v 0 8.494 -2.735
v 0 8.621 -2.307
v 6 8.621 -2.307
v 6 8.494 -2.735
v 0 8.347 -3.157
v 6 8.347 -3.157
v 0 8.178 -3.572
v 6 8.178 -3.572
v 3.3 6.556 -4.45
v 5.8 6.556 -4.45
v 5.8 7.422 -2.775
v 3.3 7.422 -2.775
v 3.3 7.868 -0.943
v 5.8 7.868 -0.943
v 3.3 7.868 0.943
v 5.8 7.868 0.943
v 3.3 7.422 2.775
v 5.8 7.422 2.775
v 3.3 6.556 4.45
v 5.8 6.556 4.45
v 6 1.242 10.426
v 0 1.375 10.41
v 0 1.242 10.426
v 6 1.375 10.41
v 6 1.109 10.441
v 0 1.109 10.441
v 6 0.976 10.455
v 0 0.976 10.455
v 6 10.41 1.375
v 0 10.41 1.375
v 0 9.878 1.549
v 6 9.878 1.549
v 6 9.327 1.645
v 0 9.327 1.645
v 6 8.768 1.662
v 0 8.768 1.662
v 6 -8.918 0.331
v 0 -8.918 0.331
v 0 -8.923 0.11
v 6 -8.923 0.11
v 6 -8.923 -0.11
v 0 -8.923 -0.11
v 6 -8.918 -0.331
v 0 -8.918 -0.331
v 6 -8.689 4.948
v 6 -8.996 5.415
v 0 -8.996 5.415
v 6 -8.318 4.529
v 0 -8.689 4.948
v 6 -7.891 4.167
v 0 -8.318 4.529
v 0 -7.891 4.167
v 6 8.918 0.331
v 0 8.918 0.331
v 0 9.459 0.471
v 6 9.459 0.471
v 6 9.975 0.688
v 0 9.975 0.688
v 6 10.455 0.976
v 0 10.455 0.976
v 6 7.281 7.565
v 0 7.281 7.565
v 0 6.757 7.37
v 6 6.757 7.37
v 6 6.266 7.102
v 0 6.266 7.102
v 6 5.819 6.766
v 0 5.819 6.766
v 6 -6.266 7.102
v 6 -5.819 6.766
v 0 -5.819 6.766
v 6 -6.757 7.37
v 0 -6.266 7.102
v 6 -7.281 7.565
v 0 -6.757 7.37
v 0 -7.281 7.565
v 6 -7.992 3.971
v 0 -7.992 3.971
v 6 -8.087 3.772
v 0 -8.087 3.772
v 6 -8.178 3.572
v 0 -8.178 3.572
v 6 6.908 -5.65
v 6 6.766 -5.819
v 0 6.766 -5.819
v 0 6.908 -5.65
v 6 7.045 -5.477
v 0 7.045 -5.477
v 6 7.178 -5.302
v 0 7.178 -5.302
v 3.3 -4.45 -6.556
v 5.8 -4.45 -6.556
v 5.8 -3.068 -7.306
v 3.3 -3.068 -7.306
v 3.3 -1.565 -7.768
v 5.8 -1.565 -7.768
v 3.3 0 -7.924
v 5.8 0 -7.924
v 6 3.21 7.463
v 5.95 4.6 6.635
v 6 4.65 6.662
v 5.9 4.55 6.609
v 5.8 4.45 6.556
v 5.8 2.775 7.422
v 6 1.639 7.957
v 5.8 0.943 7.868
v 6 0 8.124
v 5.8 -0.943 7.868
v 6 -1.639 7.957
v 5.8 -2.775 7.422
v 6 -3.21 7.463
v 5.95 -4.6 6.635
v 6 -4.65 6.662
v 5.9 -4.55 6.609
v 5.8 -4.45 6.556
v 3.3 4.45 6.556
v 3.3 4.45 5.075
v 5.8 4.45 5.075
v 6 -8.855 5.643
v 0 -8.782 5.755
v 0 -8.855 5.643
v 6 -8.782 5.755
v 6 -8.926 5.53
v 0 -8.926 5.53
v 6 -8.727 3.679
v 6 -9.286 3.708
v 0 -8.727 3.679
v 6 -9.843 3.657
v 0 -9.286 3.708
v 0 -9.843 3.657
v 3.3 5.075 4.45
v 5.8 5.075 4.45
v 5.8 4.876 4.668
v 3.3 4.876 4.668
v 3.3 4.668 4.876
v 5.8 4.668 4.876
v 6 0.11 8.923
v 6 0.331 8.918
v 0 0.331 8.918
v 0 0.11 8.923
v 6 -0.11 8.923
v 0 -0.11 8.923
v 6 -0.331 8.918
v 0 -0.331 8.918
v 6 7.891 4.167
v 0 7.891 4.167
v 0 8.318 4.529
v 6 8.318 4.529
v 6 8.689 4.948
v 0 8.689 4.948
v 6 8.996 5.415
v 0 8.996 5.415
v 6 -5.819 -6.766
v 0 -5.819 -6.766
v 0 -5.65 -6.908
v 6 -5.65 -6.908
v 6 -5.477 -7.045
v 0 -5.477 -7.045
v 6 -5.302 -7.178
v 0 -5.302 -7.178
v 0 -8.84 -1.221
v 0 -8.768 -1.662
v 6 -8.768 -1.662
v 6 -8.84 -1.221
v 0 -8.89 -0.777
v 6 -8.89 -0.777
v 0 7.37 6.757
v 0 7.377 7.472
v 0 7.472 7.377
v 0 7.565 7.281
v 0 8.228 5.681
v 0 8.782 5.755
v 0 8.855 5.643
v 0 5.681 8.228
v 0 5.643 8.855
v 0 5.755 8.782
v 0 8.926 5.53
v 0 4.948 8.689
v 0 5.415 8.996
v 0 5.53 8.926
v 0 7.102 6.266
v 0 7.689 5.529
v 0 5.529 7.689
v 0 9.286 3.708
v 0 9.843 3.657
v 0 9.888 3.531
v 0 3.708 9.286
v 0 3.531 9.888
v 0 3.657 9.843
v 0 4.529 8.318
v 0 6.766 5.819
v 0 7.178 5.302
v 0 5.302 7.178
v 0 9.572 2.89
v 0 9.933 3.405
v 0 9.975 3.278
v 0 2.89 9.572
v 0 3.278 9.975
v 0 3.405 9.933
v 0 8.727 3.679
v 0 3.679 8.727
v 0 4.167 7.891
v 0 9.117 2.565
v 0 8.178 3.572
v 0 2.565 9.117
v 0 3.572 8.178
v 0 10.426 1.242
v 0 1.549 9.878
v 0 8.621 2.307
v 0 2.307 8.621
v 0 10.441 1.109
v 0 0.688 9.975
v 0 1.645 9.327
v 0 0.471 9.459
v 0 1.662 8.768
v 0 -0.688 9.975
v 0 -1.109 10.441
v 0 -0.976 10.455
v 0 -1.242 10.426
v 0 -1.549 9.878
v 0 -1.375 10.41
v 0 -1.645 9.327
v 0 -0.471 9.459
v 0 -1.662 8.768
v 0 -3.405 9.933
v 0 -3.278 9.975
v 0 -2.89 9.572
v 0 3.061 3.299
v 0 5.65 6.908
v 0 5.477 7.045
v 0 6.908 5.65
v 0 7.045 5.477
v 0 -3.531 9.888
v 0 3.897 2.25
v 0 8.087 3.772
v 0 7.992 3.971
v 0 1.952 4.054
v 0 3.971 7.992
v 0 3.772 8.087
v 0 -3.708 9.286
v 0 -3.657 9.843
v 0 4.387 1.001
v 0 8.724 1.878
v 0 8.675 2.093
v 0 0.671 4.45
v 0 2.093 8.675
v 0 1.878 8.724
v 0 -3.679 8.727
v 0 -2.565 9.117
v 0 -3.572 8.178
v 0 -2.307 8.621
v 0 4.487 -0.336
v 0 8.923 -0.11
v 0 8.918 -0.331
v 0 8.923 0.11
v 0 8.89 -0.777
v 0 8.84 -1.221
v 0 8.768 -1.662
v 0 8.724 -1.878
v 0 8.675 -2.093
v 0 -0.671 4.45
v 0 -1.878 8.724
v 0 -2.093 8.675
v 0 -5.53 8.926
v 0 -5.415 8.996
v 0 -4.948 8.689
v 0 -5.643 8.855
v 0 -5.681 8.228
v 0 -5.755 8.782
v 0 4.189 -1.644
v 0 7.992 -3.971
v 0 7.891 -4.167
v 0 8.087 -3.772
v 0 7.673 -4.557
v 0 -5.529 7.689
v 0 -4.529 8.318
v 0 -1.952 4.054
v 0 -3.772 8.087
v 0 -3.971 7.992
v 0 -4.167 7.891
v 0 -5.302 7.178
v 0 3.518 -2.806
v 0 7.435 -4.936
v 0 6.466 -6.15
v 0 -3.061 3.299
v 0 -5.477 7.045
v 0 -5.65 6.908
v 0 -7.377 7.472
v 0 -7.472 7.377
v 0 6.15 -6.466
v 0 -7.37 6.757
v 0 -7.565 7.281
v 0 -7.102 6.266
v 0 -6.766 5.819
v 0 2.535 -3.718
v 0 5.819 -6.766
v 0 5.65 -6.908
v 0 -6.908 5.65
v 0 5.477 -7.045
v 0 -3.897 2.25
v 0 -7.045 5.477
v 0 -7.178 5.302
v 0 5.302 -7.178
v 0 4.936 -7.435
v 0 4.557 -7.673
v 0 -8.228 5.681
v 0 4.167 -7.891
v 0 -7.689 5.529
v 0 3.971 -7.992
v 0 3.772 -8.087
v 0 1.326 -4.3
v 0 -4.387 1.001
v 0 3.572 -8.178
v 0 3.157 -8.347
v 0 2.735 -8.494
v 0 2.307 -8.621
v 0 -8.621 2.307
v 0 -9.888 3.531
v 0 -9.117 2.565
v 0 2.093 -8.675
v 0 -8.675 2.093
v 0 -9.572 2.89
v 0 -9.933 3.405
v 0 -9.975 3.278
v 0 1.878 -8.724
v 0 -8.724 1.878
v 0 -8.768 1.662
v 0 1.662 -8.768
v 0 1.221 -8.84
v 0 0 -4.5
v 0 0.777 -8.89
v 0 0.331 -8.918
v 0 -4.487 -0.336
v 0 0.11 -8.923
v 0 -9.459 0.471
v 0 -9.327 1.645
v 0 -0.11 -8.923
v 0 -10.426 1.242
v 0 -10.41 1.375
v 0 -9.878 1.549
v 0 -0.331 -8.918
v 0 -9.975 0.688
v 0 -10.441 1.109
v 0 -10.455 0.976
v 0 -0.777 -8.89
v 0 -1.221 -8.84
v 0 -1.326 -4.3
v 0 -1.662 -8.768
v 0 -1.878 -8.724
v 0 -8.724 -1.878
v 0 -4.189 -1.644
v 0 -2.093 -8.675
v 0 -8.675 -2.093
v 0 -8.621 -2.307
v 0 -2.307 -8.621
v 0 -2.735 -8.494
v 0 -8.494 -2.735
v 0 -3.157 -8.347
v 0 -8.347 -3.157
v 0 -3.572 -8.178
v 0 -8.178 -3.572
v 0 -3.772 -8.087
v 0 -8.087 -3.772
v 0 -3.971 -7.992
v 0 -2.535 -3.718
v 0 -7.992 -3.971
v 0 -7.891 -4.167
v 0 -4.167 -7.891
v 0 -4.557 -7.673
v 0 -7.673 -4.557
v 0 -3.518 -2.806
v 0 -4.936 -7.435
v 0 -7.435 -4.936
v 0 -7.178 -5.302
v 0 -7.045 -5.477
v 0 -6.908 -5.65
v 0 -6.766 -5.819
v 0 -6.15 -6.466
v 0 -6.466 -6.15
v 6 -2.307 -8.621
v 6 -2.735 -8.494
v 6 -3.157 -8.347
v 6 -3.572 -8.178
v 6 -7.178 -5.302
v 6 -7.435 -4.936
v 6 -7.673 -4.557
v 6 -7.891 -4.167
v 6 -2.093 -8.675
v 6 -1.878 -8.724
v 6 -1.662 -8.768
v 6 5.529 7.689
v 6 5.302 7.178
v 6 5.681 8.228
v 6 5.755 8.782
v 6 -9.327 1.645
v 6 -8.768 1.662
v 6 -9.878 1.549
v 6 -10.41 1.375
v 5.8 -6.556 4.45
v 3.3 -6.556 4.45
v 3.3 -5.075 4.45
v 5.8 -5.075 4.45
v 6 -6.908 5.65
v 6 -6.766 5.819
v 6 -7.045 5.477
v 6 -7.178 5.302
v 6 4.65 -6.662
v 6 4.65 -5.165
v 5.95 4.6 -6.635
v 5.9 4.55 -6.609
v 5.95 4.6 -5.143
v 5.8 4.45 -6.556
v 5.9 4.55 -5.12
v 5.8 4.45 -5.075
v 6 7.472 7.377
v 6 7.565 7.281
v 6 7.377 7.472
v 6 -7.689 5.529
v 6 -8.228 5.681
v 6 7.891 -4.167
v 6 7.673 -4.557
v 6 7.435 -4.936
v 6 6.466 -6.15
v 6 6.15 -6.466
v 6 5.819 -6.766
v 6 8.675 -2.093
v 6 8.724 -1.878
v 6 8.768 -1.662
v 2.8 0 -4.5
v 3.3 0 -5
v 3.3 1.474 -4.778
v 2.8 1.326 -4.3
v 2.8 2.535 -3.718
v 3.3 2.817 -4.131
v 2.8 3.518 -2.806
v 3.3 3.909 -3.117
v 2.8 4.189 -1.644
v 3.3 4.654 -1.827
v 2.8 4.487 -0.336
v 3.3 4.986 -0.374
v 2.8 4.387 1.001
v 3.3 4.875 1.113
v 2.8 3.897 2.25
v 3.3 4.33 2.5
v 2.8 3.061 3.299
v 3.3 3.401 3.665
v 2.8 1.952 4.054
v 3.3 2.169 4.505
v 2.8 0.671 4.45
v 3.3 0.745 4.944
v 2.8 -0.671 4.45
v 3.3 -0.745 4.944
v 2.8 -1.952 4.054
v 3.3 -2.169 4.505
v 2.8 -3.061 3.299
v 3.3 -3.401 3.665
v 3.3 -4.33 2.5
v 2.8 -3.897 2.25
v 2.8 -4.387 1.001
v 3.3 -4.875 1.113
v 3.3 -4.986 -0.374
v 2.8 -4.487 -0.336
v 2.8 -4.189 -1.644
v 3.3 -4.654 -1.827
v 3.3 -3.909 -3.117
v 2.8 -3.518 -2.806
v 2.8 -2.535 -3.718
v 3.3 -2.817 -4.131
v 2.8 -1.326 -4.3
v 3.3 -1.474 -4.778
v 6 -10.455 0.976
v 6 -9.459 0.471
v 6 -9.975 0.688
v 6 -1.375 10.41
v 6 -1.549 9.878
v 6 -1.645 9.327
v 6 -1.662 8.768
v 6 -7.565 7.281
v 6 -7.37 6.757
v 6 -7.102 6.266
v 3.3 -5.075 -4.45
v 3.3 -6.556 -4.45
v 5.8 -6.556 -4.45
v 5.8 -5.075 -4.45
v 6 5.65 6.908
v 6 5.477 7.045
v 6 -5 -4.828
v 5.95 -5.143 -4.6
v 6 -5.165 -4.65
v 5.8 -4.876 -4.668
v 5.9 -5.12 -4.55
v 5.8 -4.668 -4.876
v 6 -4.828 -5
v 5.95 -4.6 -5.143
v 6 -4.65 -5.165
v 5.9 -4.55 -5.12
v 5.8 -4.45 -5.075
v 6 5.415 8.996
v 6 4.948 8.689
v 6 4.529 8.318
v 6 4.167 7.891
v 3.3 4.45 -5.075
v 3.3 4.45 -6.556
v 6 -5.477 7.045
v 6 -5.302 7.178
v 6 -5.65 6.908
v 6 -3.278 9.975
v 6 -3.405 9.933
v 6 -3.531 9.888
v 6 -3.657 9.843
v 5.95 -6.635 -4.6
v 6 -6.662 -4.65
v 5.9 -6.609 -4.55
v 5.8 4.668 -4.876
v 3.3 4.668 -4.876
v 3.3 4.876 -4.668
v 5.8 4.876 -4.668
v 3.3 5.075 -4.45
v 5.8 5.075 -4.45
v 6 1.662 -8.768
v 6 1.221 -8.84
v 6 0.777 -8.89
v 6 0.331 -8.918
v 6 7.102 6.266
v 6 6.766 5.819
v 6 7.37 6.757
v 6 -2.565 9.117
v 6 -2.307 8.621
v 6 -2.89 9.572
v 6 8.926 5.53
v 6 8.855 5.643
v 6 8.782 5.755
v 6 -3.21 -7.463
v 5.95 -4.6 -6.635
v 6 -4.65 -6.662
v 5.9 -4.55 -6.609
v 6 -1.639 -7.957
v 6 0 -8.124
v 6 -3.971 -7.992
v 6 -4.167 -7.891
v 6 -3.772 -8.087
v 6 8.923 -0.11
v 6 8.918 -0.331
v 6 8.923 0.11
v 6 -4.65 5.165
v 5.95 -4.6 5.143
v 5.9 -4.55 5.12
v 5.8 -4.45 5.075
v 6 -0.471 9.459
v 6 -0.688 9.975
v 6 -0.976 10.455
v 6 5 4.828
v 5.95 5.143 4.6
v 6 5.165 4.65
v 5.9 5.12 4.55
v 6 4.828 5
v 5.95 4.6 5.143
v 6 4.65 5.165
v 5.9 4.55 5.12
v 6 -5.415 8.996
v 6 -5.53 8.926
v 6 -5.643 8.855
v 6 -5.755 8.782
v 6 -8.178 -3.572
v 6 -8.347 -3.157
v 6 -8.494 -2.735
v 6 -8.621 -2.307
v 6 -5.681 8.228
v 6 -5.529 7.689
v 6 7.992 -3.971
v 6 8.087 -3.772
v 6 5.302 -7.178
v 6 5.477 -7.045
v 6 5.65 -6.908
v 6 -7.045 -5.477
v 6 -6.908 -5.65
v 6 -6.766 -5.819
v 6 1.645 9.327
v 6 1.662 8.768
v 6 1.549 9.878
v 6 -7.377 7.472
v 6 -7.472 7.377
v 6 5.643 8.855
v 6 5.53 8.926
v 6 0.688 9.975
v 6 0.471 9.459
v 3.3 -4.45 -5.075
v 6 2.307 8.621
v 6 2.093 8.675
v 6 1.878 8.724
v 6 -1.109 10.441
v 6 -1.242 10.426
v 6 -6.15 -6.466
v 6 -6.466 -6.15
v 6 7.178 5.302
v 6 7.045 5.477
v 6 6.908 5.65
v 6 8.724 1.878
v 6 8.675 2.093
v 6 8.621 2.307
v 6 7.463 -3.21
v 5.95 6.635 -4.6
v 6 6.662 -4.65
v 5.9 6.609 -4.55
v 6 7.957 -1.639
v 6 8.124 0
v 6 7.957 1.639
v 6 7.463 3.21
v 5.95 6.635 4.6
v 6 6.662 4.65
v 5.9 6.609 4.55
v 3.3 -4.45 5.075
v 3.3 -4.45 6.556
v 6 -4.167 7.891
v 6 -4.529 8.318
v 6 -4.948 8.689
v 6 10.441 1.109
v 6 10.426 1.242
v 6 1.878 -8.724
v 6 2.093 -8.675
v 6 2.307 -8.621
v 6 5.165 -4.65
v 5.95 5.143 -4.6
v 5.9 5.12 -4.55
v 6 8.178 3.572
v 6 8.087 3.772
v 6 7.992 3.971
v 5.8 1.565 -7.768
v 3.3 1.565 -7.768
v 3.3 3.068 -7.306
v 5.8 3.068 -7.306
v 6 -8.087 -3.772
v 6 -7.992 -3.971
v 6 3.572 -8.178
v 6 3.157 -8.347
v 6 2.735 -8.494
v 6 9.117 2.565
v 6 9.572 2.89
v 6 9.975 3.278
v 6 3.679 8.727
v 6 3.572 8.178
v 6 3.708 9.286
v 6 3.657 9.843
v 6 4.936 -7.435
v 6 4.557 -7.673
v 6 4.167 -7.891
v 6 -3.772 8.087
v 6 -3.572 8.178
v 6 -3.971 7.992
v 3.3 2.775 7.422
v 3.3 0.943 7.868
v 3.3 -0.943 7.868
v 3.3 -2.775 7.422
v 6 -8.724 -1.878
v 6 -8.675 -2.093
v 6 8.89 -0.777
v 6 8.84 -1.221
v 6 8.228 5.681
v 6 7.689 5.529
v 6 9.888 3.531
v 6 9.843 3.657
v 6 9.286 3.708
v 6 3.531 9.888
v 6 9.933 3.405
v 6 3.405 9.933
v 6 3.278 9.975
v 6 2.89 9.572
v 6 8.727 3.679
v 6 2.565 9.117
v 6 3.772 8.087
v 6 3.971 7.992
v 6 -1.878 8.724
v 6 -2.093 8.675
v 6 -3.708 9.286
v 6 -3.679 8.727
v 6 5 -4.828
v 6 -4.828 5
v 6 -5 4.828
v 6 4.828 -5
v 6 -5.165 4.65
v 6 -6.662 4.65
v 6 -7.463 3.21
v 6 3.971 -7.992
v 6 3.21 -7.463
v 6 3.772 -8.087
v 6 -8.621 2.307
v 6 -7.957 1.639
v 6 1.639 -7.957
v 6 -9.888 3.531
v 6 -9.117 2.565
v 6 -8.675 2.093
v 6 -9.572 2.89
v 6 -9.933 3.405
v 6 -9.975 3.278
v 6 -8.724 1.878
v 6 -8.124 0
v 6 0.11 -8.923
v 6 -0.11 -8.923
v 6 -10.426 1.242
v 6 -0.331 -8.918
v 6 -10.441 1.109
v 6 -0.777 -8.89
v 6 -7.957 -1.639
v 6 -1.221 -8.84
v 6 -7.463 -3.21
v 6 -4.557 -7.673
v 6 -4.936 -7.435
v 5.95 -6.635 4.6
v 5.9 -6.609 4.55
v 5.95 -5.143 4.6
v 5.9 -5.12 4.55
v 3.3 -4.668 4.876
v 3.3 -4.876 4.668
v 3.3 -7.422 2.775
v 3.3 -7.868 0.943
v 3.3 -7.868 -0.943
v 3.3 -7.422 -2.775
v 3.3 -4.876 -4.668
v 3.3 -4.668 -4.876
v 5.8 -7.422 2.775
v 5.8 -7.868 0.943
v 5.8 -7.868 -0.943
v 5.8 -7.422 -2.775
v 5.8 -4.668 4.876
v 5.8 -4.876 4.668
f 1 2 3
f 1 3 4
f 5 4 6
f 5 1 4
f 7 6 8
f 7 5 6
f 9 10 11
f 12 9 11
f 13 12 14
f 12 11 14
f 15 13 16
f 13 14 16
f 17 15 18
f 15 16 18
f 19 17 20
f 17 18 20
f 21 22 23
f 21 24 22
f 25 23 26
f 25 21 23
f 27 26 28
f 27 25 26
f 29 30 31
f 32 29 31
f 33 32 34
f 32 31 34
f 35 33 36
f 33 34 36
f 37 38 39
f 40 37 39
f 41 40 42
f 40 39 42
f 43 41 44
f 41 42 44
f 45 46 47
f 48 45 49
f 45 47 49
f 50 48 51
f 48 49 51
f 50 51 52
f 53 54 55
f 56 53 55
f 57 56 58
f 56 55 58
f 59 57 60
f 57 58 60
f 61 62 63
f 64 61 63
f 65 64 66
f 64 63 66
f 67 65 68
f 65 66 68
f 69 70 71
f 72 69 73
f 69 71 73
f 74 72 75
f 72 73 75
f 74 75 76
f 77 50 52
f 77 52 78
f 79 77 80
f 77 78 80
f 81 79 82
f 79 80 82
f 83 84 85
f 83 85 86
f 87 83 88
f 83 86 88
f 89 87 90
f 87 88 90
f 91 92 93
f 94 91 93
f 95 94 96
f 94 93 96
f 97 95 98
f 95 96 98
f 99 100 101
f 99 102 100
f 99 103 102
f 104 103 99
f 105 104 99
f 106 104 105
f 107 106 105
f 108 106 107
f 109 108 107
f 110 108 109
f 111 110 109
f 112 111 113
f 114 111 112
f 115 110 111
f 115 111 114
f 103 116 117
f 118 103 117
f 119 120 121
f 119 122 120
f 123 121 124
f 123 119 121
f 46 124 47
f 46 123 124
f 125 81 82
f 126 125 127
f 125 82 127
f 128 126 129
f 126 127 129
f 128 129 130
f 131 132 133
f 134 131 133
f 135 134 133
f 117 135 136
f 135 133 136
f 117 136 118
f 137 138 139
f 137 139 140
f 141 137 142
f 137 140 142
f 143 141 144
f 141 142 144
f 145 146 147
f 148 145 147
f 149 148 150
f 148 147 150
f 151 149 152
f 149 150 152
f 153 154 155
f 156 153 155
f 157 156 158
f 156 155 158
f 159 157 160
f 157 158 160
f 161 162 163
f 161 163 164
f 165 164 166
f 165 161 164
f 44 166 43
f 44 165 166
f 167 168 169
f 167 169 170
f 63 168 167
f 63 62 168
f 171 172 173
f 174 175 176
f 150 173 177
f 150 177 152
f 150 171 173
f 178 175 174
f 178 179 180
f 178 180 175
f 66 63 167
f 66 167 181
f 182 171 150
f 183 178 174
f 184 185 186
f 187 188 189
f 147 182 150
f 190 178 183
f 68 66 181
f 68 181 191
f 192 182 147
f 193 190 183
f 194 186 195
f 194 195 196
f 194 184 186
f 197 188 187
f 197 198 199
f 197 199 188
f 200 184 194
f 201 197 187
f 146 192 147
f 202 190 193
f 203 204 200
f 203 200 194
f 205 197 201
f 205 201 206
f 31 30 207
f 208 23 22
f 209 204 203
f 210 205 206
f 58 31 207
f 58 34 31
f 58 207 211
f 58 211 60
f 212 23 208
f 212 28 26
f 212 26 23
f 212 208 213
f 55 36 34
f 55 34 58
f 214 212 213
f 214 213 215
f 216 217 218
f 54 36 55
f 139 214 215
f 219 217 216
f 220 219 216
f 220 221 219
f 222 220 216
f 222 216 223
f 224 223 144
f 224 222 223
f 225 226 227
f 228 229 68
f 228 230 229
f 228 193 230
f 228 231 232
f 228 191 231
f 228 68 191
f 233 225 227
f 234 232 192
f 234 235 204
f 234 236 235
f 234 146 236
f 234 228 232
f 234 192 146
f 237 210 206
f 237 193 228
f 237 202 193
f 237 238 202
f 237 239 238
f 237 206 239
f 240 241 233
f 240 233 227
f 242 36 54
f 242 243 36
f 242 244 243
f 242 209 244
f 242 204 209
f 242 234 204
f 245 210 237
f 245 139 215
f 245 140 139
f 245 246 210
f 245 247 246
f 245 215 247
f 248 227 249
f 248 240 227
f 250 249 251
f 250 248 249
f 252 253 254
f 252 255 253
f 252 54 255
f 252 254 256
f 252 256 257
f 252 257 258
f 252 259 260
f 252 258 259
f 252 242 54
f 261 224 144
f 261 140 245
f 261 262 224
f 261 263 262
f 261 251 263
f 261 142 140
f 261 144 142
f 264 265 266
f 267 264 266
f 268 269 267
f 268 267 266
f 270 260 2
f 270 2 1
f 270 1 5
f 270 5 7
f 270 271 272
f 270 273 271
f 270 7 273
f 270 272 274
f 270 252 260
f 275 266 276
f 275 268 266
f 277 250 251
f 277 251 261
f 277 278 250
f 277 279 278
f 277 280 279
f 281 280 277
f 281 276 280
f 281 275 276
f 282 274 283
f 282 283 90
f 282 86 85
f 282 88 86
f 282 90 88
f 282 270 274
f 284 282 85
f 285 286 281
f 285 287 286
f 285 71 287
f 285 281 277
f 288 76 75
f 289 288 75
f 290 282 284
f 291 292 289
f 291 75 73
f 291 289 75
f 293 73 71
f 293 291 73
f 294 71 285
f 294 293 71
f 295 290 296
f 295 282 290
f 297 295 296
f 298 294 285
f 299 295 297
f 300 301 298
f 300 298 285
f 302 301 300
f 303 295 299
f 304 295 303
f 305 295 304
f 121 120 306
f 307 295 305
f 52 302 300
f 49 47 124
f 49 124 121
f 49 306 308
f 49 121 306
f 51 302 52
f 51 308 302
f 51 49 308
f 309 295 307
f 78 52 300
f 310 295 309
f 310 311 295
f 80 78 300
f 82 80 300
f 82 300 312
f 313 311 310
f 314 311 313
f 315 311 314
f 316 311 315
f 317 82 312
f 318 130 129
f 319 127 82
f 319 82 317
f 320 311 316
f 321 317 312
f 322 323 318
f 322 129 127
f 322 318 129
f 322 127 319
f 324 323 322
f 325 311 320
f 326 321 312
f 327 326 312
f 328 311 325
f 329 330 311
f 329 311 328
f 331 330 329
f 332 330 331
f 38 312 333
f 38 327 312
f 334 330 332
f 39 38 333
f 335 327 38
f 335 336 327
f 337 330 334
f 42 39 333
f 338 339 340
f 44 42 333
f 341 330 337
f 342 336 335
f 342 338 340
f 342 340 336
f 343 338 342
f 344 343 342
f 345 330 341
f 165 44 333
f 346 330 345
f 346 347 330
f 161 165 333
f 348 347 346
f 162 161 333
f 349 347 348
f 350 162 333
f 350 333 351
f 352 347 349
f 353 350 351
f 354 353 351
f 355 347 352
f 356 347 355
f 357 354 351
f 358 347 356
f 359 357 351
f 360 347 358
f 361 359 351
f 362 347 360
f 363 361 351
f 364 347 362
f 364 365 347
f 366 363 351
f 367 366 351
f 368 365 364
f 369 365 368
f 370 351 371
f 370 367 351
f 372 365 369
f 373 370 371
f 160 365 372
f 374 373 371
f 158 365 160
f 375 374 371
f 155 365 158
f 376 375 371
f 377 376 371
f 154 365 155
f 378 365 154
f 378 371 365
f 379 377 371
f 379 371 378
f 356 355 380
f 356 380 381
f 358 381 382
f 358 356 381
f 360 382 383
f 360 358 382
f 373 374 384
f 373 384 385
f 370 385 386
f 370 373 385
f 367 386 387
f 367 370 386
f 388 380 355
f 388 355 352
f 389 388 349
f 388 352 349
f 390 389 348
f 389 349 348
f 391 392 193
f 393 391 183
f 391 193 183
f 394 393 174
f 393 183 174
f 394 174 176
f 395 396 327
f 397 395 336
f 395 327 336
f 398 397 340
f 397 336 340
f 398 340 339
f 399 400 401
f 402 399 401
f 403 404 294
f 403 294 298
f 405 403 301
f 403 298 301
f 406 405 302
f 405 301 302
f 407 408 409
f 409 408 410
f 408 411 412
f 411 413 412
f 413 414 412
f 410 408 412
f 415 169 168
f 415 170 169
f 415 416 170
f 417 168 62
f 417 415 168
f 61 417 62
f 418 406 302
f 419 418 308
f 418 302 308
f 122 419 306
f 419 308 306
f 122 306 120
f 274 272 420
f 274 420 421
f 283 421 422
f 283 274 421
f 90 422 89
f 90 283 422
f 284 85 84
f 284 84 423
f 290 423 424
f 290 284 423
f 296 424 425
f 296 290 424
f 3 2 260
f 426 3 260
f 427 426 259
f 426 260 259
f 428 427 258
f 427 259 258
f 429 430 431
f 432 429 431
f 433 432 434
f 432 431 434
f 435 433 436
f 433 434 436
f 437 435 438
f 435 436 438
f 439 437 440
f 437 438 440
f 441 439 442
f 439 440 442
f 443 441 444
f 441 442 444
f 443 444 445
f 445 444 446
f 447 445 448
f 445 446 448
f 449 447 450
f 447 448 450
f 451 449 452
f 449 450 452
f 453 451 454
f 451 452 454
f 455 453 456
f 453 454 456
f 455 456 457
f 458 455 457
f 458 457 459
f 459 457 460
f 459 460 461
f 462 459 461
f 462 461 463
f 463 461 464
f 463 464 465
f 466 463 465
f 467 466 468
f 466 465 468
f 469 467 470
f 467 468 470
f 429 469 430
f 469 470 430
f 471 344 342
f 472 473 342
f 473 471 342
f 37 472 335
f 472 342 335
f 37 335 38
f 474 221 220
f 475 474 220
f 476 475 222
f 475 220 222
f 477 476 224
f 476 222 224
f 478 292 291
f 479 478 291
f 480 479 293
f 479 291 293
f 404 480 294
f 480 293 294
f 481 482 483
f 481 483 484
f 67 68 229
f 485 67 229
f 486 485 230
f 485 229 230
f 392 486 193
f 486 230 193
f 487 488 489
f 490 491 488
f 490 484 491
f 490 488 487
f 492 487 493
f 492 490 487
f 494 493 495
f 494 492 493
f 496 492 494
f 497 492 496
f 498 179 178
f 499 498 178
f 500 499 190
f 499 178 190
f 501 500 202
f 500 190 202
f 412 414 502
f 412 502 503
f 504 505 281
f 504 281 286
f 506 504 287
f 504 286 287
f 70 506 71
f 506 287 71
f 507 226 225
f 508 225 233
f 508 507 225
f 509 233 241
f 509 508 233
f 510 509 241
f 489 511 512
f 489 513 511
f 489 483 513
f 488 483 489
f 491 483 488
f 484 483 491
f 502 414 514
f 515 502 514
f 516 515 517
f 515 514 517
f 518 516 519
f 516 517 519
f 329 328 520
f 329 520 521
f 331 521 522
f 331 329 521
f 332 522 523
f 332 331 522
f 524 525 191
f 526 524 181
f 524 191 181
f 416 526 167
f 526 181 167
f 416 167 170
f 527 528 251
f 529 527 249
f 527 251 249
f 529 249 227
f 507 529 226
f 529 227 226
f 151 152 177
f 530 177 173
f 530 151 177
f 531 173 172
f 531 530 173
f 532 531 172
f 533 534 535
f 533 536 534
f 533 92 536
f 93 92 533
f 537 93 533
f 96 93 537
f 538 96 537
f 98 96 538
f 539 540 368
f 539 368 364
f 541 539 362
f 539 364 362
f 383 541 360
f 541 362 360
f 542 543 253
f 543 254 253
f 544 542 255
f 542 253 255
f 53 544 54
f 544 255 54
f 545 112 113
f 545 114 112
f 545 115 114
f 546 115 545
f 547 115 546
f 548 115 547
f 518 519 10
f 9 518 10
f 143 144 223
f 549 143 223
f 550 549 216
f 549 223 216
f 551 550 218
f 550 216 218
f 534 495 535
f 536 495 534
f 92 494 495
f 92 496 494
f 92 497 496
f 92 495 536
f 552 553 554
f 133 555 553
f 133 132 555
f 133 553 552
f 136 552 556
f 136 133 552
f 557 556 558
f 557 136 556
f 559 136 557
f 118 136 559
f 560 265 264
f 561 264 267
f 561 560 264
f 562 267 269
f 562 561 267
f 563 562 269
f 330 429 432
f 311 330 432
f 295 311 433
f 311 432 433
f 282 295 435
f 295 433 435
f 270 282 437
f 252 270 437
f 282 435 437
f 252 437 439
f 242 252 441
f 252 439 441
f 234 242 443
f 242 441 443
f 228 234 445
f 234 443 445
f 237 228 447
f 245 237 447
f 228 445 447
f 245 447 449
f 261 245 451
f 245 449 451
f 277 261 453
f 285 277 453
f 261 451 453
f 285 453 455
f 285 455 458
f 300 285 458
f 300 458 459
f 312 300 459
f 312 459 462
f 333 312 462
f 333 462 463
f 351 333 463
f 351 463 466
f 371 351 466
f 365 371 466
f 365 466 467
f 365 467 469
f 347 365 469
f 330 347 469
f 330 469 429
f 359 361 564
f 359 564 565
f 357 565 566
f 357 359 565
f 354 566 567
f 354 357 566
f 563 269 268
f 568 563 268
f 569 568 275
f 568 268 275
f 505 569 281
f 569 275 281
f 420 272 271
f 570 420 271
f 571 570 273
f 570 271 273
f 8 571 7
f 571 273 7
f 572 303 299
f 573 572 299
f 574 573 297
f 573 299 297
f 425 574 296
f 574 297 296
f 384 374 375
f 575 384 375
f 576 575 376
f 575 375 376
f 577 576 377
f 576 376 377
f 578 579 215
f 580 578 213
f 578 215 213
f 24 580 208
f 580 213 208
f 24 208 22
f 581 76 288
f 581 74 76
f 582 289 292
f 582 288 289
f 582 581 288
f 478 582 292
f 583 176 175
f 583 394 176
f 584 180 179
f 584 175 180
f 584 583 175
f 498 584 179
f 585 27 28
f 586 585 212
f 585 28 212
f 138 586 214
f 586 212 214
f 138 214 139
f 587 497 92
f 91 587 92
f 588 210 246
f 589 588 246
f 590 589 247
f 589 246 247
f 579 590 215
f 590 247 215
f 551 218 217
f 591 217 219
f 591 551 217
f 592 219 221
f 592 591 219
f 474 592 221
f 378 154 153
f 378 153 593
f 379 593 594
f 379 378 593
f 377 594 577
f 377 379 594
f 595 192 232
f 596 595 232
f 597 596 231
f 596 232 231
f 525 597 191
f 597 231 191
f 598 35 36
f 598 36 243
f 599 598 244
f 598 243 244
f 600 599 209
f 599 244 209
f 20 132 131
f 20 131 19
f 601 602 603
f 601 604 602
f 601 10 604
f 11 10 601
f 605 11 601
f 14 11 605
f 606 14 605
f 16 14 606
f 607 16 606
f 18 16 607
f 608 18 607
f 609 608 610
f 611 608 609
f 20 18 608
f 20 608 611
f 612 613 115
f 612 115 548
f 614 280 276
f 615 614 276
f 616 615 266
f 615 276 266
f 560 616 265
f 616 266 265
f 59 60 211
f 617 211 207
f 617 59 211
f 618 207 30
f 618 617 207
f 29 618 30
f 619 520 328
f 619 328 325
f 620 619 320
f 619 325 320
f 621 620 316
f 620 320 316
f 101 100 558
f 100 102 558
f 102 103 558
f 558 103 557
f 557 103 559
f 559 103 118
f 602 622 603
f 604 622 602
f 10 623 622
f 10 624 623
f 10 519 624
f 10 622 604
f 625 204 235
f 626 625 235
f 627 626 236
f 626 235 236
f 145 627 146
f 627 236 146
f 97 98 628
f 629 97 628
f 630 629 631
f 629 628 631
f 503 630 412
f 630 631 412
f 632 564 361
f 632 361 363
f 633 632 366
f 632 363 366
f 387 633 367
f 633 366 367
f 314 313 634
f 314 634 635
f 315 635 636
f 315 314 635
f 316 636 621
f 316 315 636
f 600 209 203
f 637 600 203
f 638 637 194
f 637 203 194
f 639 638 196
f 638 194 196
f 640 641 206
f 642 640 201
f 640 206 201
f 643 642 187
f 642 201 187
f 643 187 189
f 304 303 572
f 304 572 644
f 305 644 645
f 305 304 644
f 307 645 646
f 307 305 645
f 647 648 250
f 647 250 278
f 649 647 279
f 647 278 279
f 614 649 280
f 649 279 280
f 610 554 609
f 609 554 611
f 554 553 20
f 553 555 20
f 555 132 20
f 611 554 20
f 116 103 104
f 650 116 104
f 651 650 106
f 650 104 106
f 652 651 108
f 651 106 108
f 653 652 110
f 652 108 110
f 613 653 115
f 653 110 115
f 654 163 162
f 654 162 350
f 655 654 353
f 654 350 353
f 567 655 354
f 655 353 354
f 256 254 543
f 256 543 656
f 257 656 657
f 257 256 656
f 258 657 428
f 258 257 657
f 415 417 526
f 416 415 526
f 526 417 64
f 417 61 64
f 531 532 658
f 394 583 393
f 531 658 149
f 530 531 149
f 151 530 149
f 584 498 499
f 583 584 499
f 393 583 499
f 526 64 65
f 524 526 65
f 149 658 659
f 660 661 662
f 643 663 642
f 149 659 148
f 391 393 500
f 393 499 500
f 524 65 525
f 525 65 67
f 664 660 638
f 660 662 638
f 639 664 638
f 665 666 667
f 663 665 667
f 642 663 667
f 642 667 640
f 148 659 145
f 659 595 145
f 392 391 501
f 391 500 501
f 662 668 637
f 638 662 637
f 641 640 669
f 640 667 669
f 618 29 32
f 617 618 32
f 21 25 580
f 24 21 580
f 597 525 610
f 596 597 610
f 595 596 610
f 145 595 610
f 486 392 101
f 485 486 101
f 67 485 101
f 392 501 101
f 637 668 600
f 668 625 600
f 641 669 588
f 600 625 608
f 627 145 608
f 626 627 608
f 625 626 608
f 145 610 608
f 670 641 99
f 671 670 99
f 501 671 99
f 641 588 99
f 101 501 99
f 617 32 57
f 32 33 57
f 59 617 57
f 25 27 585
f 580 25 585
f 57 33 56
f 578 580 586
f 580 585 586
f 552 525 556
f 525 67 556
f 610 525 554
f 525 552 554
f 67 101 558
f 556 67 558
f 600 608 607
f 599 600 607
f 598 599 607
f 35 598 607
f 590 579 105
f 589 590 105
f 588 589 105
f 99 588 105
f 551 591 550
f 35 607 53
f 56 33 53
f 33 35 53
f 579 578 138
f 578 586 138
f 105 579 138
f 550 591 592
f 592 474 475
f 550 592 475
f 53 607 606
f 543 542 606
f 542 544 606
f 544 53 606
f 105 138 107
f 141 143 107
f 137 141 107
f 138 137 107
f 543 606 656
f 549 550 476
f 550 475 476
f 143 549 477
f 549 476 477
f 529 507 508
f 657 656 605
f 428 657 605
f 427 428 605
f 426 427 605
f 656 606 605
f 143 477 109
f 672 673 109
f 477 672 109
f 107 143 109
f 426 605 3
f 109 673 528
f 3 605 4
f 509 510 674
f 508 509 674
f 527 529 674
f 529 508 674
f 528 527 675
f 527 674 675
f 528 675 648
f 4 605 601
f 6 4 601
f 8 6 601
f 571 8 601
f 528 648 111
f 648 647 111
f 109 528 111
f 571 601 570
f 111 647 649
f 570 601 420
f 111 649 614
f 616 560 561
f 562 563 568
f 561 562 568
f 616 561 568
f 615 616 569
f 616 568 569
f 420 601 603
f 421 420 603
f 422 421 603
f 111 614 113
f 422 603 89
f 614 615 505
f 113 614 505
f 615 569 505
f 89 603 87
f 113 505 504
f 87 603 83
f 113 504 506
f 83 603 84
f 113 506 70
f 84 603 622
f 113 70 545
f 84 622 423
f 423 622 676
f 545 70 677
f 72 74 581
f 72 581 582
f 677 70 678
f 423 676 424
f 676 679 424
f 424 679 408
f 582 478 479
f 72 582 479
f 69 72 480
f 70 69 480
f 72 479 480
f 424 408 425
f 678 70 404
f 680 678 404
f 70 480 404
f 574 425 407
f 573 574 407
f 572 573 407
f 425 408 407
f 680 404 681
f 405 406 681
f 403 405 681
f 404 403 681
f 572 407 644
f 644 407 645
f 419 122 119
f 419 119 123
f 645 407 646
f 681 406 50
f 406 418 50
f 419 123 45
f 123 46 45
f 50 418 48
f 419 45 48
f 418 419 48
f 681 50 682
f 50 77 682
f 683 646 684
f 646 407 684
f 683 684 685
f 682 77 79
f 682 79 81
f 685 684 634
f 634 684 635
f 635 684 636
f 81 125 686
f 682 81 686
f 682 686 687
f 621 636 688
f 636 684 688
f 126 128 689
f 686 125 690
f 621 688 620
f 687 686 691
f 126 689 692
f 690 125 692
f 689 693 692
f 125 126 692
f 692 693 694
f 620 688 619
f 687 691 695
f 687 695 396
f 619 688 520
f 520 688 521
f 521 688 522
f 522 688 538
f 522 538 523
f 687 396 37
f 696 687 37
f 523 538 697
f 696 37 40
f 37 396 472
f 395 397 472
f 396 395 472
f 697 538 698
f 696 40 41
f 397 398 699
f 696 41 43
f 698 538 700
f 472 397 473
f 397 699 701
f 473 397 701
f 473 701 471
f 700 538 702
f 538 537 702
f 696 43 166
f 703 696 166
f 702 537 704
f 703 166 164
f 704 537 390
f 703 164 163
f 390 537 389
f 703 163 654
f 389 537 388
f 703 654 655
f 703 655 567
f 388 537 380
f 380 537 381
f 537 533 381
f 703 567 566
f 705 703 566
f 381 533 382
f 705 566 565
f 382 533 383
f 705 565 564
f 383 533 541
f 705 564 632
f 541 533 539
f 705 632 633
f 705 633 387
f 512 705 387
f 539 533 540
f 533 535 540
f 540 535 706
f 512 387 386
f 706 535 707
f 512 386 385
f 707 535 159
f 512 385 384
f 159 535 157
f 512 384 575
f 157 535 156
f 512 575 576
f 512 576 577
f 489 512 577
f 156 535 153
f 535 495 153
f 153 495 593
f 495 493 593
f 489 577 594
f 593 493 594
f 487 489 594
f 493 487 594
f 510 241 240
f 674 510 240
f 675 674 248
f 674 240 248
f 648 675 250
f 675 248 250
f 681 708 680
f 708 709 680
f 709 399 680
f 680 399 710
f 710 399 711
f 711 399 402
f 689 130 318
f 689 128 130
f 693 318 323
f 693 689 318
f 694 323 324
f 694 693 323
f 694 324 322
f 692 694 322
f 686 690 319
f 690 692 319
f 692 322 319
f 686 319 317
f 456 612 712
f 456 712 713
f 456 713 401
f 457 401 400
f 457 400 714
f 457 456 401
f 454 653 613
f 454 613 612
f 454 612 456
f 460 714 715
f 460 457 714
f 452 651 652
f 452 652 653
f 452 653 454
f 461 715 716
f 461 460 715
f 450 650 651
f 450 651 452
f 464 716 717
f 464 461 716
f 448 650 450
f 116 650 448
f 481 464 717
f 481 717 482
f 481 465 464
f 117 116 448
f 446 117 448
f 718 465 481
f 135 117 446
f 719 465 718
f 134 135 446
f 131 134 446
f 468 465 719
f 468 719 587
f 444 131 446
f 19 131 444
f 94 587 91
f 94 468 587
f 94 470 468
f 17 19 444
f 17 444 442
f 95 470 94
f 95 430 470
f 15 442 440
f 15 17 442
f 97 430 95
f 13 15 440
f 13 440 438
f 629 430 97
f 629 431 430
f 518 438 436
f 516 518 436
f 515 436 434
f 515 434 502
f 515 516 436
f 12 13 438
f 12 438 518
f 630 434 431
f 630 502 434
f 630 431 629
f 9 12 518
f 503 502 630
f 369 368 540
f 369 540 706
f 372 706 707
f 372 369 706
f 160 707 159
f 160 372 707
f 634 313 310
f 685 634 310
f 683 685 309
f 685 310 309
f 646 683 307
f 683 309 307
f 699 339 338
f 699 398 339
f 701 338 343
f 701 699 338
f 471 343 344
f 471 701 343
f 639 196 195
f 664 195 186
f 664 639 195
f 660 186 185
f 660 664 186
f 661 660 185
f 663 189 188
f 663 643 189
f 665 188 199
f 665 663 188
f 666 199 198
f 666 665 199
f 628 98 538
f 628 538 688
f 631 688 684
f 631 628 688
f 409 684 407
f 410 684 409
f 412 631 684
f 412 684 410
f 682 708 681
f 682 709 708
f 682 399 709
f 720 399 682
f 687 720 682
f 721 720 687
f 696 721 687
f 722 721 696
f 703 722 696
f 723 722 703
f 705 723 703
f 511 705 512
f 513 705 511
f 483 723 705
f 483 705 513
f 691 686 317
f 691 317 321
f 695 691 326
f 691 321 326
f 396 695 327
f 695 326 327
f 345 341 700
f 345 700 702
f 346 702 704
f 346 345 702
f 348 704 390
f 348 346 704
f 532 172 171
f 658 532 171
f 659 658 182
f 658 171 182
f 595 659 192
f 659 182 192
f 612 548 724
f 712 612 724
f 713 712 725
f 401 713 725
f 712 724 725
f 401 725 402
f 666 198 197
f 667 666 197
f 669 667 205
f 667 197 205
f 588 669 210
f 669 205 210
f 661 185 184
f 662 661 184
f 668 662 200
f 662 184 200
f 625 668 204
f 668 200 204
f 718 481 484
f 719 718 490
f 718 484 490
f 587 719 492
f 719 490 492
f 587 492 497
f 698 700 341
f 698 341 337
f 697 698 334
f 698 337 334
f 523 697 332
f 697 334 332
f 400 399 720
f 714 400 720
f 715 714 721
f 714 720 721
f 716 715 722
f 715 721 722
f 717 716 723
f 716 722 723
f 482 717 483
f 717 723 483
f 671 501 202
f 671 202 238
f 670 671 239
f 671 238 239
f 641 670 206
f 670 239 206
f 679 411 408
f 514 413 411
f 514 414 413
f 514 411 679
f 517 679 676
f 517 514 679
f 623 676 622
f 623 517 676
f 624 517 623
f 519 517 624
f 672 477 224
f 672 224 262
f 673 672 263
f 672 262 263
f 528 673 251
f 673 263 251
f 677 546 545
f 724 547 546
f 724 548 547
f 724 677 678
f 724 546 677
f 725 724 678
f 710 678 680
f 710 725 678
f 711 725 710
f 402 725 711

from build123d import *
from build123d.topology import SkipClean

# Parameters (mm, degrees)
BASPROSKE_W                     = 6
BASPROSKE_H                     = 10.5
TOOTHCUT_DEPTH                  = 17.015617378
TEETHCUTS_COUNT                 = 28
TEETHCUTS_ANGLE                 = 347.142857143
BORSKE_R                        = 1.5
BORE_DEPTH                      = 50.0000508
SZKIC1_R                        = 6.75
WYTNIJ_WYCI_GNI_CIE1_DEPTH      = 2.7
SZKIC2_R                        = 4.5
WYTNIJ_WYCI_GNI_CIE2_DEPTH      = 16.148783562
SZKIC3_W                        = 8.9
SZKIC3_H                        = 2.106468257
SZKIC3_W_2                      = 2.106468257
SZKIC3_H_2                      = 8.9
WYTNIJ_WYCI_GNI_CIE3_DEPTH      = 2.7
WYTNIJ_WYCI_GNI_CIE4_DEPTH      = 16.148783562
WYTNIJ_WYCI_GNI_CIE4_DEPTH_BACK = 16.148783562
SFAZOWANIE1_SIZE                = 0.2
SFAZOWANIE2_SIZE                = 0.5


with BuildPart() as part:
    # BasProSke → Base-Revolve (revolve)
    with BuildSketch(Plane(origin=(0, 0, 0), x_dir=(1, 0, 0), z_dir=(0, 1, 0)), mode=Mode.PRIVATE) as base_revolve_sk:
        with Locations((3, 5.25)):
            Rectangle(BASPROSKE_W, BASPROSKE_H)
    revolve(base_revolve_sk.sketch.rotate(Axis((-10, 0, 0), (1, 0, 0)), 180), axis=Axis((-10, 0, 0), (1, 0, 0)))

    # TooCutSke → ToothCut (cut, through all)
    with BuildSketch(Plane(origin=(0, 0, 0), x_dir=(0, 0, -1), z_dir=(1, 0, 0))):
        with BuildLine():
            ThreePointArc((0.330517784, 8.917877213), (0, 8.924), (-0.330517784, 8.917877213))
            ThreePointArc((-0.330517784, 8.917877213), (-0.576240803, 9.73440515), (-0.992712377, 10.478481154))
            ThreePointArc((-0.992712377, 10.478481154), (0, 10.5254), (0.992712377, 10.478481154))
            ThreePointArc((0.992712377, 10.478481154), (0.576240803, 9.73440515), (0.330517784, 8.917877213))
        make_face()
    toothcut = extrude(amount=TOOTHCUT_DEPTH, mode=Mode.SUBTRACT)

    # TeethCuts: ToothCut ×28 about axis
    teethcuts_axis = Axis((-10, 0, 0), (1, 0, 0))
    for i in range(1, TEETHCUTS_COUNT):
        add(toothcut.rotate(teethcuts_axis, i * TEETHCUTS_ANGLE / (TEETHCUTS_COUNT - 1)), mode=Mode.SUBTRACT)

    # BorSke → Bore (cut, symmetric)
    with BuildSketch(Plane(origin=(0, 0, 0), x_dir=(0, 0, -1), z_dir=(1, 0, 0))):
        with Locations(Location((0, 0, 0), (0, 0, 180))):
            Circle(BORSKE_R)
    extrude(amount=BORE_DEPTH, both=True, mode=Mode.SUBTRACT)

    # Szkic1 → Wytnij-wyciągnięcie1 (cut)
    with BuildSketch(Plane(origin=(6, 0, 0), x_dir=(0, 0, -1), z_dir=(1, 0, 0))):
        Circle(SZKIC1_R)
    extrude(amount=-WYTNIJ_WYCI_GNI_CIE1_DEPTH, mode=Mode.SUBTRACT)

    # Szkic2 → Wytnij-wyciągnięcie2 (cut, through all)
    with BuildSketch(Plane(origin=(3.3, 0, 0), x_dir=(0, 0, -1), z_dir=(1, 0, 0))):
        Circle(SZKIC2_R)
    extrude(amount=-WYTNIJ_WYCI_GNI_CIE2_DEPTH, mode=Mode.SUBTRACT)

    # Szkic3 → Wytnij-wyciągnięcie3 (cut)
    with BuildSketch(Plane(origin=(6, 0, 0), x_dir=(0, 0, -1), z_dir=(1, 0, 0))):
        with Locations((0, 5.503234129)):
            Rectangle(SZKIC3_W, SZKIC3_H)
        with Locations((-5.503234129, 0)):
            Rectangle(SZKIC3_W_2, SZKIC3_H_2)
        with BuildLine():
            ThreePointArc((-6.556468257, 4.45), (-7.924, 0), (-6.556468257, -4.45))
            Line((-6.556468257, -4.45), (-6.556468257, 4.45))
        make_face()
        with BuildLine():
            Line((-4.45, 6.556468257), (4.45, 6.556468257))
            ThreePointArc((4.45, 6.556468257), (0, 7.924), (-4.45, 6.556468257))
        make_face()
        with BuildLine():
            Line((6.556468257, 4.45), (6.556468257, -4.45))
            ThreePointArc((6.556468257, -4.45), (7.574405273, -2.327694303), (7.924, 0))
            ThreePointArc((7.924, 0), (7.574405273, 2.327694303), (6.556468257, 4.45))
        make_face()
        with Locations((5.503234129, 0)):
            Rectangle(SZKIC3_W_2, SZKIC3_H_2)
        with BuildLine():
            ThreePointArc((-4.45, -6.556468257), (0, -7.924), (4.45, -6.556468257))
            Line((4.45, -6.556468257), (-4.45, -6.556468257))
        make_face()
        with Locations((0, -5.503234129)):
            Rectangle(SZKIC3_W, SZKIC3_H)
    extrude(amount=-WYTNIJ_WYCI_GNI_CIE3_DEPTH, mode=Mode.SUBTRACT)

    # Szkic4 → Wytnij-wyciągnięcie4 (cut, two sides: drawn at the far end of the back side and taken through both)
    with SkipClean():  # the faces are left unmerged after this step: merging them gives an invalid solid
        with BuildSketch(Plane(origin=(3.3, 0, 0), x_dir=(0, 0, -1), z_dir=(1, 0, 0)).offset(-WYTNIJ_WYCI_GNI_CIE4_DEPTH_BACK)):
            with BuildLine():
                Line((0, 10.924), (0, 8.924))
                ThreePointArc((0, 8.924), (8.924, 0), (0, -8.924))
                Line((0, -8.924), (0, -10.924))
                ThreePointArc((0, -10.924), (10.924, 0), (0, 10.924))
            make_face()
        extrude(amount=WYTNIJ_WYCI_GNI_CIE4_DEPTH + WYTNIJ_WYCI_GNI_CIE4_DEPTH_BACK, mode=Mode.SUBTRACT)

    # Sfazowanie1
    sfazowanie1_edges = [part.edges().sort_by_distance(p)[0] for p in [
        (6, 4.772970773, -4.772970773),
        (6, -4.772970773, 4.772970773),
        (6, 4.45, 5.815949636),
        (6, 0, 7.924),
        (6, -4.45, 5.815949636),
        (6, 4.45, -5.815949636),
        (6, 0, -7.924),
        (6, -4.45, -5.815949636),
        (6, 4.772970773, 4.772970773),
        (6, 5.815949636, -4.45),
        (6, 7.924, 0),
        (6, 5.815949636, 4.45),
        (6, -4.772970773, -4.772970773),
        (6, -5.815949636, -4.45),
        (6, -7.924, 0),
        (6, -5.815949636, 4.45),
    ]]
    chamfer(sfazowanie1_edges, length=SFAZOWANIE1_SIZE)

    # Sfazowanie2
    sfazowanie2_edges = [part.edges().sort_by_distance(p)[0] for p in [
        (3.3, 0, 4.5),
    ]]
    chamfer(sfazowanie2_edges, length=SFAZOWANIE2_SIZE)


solid = part.part
